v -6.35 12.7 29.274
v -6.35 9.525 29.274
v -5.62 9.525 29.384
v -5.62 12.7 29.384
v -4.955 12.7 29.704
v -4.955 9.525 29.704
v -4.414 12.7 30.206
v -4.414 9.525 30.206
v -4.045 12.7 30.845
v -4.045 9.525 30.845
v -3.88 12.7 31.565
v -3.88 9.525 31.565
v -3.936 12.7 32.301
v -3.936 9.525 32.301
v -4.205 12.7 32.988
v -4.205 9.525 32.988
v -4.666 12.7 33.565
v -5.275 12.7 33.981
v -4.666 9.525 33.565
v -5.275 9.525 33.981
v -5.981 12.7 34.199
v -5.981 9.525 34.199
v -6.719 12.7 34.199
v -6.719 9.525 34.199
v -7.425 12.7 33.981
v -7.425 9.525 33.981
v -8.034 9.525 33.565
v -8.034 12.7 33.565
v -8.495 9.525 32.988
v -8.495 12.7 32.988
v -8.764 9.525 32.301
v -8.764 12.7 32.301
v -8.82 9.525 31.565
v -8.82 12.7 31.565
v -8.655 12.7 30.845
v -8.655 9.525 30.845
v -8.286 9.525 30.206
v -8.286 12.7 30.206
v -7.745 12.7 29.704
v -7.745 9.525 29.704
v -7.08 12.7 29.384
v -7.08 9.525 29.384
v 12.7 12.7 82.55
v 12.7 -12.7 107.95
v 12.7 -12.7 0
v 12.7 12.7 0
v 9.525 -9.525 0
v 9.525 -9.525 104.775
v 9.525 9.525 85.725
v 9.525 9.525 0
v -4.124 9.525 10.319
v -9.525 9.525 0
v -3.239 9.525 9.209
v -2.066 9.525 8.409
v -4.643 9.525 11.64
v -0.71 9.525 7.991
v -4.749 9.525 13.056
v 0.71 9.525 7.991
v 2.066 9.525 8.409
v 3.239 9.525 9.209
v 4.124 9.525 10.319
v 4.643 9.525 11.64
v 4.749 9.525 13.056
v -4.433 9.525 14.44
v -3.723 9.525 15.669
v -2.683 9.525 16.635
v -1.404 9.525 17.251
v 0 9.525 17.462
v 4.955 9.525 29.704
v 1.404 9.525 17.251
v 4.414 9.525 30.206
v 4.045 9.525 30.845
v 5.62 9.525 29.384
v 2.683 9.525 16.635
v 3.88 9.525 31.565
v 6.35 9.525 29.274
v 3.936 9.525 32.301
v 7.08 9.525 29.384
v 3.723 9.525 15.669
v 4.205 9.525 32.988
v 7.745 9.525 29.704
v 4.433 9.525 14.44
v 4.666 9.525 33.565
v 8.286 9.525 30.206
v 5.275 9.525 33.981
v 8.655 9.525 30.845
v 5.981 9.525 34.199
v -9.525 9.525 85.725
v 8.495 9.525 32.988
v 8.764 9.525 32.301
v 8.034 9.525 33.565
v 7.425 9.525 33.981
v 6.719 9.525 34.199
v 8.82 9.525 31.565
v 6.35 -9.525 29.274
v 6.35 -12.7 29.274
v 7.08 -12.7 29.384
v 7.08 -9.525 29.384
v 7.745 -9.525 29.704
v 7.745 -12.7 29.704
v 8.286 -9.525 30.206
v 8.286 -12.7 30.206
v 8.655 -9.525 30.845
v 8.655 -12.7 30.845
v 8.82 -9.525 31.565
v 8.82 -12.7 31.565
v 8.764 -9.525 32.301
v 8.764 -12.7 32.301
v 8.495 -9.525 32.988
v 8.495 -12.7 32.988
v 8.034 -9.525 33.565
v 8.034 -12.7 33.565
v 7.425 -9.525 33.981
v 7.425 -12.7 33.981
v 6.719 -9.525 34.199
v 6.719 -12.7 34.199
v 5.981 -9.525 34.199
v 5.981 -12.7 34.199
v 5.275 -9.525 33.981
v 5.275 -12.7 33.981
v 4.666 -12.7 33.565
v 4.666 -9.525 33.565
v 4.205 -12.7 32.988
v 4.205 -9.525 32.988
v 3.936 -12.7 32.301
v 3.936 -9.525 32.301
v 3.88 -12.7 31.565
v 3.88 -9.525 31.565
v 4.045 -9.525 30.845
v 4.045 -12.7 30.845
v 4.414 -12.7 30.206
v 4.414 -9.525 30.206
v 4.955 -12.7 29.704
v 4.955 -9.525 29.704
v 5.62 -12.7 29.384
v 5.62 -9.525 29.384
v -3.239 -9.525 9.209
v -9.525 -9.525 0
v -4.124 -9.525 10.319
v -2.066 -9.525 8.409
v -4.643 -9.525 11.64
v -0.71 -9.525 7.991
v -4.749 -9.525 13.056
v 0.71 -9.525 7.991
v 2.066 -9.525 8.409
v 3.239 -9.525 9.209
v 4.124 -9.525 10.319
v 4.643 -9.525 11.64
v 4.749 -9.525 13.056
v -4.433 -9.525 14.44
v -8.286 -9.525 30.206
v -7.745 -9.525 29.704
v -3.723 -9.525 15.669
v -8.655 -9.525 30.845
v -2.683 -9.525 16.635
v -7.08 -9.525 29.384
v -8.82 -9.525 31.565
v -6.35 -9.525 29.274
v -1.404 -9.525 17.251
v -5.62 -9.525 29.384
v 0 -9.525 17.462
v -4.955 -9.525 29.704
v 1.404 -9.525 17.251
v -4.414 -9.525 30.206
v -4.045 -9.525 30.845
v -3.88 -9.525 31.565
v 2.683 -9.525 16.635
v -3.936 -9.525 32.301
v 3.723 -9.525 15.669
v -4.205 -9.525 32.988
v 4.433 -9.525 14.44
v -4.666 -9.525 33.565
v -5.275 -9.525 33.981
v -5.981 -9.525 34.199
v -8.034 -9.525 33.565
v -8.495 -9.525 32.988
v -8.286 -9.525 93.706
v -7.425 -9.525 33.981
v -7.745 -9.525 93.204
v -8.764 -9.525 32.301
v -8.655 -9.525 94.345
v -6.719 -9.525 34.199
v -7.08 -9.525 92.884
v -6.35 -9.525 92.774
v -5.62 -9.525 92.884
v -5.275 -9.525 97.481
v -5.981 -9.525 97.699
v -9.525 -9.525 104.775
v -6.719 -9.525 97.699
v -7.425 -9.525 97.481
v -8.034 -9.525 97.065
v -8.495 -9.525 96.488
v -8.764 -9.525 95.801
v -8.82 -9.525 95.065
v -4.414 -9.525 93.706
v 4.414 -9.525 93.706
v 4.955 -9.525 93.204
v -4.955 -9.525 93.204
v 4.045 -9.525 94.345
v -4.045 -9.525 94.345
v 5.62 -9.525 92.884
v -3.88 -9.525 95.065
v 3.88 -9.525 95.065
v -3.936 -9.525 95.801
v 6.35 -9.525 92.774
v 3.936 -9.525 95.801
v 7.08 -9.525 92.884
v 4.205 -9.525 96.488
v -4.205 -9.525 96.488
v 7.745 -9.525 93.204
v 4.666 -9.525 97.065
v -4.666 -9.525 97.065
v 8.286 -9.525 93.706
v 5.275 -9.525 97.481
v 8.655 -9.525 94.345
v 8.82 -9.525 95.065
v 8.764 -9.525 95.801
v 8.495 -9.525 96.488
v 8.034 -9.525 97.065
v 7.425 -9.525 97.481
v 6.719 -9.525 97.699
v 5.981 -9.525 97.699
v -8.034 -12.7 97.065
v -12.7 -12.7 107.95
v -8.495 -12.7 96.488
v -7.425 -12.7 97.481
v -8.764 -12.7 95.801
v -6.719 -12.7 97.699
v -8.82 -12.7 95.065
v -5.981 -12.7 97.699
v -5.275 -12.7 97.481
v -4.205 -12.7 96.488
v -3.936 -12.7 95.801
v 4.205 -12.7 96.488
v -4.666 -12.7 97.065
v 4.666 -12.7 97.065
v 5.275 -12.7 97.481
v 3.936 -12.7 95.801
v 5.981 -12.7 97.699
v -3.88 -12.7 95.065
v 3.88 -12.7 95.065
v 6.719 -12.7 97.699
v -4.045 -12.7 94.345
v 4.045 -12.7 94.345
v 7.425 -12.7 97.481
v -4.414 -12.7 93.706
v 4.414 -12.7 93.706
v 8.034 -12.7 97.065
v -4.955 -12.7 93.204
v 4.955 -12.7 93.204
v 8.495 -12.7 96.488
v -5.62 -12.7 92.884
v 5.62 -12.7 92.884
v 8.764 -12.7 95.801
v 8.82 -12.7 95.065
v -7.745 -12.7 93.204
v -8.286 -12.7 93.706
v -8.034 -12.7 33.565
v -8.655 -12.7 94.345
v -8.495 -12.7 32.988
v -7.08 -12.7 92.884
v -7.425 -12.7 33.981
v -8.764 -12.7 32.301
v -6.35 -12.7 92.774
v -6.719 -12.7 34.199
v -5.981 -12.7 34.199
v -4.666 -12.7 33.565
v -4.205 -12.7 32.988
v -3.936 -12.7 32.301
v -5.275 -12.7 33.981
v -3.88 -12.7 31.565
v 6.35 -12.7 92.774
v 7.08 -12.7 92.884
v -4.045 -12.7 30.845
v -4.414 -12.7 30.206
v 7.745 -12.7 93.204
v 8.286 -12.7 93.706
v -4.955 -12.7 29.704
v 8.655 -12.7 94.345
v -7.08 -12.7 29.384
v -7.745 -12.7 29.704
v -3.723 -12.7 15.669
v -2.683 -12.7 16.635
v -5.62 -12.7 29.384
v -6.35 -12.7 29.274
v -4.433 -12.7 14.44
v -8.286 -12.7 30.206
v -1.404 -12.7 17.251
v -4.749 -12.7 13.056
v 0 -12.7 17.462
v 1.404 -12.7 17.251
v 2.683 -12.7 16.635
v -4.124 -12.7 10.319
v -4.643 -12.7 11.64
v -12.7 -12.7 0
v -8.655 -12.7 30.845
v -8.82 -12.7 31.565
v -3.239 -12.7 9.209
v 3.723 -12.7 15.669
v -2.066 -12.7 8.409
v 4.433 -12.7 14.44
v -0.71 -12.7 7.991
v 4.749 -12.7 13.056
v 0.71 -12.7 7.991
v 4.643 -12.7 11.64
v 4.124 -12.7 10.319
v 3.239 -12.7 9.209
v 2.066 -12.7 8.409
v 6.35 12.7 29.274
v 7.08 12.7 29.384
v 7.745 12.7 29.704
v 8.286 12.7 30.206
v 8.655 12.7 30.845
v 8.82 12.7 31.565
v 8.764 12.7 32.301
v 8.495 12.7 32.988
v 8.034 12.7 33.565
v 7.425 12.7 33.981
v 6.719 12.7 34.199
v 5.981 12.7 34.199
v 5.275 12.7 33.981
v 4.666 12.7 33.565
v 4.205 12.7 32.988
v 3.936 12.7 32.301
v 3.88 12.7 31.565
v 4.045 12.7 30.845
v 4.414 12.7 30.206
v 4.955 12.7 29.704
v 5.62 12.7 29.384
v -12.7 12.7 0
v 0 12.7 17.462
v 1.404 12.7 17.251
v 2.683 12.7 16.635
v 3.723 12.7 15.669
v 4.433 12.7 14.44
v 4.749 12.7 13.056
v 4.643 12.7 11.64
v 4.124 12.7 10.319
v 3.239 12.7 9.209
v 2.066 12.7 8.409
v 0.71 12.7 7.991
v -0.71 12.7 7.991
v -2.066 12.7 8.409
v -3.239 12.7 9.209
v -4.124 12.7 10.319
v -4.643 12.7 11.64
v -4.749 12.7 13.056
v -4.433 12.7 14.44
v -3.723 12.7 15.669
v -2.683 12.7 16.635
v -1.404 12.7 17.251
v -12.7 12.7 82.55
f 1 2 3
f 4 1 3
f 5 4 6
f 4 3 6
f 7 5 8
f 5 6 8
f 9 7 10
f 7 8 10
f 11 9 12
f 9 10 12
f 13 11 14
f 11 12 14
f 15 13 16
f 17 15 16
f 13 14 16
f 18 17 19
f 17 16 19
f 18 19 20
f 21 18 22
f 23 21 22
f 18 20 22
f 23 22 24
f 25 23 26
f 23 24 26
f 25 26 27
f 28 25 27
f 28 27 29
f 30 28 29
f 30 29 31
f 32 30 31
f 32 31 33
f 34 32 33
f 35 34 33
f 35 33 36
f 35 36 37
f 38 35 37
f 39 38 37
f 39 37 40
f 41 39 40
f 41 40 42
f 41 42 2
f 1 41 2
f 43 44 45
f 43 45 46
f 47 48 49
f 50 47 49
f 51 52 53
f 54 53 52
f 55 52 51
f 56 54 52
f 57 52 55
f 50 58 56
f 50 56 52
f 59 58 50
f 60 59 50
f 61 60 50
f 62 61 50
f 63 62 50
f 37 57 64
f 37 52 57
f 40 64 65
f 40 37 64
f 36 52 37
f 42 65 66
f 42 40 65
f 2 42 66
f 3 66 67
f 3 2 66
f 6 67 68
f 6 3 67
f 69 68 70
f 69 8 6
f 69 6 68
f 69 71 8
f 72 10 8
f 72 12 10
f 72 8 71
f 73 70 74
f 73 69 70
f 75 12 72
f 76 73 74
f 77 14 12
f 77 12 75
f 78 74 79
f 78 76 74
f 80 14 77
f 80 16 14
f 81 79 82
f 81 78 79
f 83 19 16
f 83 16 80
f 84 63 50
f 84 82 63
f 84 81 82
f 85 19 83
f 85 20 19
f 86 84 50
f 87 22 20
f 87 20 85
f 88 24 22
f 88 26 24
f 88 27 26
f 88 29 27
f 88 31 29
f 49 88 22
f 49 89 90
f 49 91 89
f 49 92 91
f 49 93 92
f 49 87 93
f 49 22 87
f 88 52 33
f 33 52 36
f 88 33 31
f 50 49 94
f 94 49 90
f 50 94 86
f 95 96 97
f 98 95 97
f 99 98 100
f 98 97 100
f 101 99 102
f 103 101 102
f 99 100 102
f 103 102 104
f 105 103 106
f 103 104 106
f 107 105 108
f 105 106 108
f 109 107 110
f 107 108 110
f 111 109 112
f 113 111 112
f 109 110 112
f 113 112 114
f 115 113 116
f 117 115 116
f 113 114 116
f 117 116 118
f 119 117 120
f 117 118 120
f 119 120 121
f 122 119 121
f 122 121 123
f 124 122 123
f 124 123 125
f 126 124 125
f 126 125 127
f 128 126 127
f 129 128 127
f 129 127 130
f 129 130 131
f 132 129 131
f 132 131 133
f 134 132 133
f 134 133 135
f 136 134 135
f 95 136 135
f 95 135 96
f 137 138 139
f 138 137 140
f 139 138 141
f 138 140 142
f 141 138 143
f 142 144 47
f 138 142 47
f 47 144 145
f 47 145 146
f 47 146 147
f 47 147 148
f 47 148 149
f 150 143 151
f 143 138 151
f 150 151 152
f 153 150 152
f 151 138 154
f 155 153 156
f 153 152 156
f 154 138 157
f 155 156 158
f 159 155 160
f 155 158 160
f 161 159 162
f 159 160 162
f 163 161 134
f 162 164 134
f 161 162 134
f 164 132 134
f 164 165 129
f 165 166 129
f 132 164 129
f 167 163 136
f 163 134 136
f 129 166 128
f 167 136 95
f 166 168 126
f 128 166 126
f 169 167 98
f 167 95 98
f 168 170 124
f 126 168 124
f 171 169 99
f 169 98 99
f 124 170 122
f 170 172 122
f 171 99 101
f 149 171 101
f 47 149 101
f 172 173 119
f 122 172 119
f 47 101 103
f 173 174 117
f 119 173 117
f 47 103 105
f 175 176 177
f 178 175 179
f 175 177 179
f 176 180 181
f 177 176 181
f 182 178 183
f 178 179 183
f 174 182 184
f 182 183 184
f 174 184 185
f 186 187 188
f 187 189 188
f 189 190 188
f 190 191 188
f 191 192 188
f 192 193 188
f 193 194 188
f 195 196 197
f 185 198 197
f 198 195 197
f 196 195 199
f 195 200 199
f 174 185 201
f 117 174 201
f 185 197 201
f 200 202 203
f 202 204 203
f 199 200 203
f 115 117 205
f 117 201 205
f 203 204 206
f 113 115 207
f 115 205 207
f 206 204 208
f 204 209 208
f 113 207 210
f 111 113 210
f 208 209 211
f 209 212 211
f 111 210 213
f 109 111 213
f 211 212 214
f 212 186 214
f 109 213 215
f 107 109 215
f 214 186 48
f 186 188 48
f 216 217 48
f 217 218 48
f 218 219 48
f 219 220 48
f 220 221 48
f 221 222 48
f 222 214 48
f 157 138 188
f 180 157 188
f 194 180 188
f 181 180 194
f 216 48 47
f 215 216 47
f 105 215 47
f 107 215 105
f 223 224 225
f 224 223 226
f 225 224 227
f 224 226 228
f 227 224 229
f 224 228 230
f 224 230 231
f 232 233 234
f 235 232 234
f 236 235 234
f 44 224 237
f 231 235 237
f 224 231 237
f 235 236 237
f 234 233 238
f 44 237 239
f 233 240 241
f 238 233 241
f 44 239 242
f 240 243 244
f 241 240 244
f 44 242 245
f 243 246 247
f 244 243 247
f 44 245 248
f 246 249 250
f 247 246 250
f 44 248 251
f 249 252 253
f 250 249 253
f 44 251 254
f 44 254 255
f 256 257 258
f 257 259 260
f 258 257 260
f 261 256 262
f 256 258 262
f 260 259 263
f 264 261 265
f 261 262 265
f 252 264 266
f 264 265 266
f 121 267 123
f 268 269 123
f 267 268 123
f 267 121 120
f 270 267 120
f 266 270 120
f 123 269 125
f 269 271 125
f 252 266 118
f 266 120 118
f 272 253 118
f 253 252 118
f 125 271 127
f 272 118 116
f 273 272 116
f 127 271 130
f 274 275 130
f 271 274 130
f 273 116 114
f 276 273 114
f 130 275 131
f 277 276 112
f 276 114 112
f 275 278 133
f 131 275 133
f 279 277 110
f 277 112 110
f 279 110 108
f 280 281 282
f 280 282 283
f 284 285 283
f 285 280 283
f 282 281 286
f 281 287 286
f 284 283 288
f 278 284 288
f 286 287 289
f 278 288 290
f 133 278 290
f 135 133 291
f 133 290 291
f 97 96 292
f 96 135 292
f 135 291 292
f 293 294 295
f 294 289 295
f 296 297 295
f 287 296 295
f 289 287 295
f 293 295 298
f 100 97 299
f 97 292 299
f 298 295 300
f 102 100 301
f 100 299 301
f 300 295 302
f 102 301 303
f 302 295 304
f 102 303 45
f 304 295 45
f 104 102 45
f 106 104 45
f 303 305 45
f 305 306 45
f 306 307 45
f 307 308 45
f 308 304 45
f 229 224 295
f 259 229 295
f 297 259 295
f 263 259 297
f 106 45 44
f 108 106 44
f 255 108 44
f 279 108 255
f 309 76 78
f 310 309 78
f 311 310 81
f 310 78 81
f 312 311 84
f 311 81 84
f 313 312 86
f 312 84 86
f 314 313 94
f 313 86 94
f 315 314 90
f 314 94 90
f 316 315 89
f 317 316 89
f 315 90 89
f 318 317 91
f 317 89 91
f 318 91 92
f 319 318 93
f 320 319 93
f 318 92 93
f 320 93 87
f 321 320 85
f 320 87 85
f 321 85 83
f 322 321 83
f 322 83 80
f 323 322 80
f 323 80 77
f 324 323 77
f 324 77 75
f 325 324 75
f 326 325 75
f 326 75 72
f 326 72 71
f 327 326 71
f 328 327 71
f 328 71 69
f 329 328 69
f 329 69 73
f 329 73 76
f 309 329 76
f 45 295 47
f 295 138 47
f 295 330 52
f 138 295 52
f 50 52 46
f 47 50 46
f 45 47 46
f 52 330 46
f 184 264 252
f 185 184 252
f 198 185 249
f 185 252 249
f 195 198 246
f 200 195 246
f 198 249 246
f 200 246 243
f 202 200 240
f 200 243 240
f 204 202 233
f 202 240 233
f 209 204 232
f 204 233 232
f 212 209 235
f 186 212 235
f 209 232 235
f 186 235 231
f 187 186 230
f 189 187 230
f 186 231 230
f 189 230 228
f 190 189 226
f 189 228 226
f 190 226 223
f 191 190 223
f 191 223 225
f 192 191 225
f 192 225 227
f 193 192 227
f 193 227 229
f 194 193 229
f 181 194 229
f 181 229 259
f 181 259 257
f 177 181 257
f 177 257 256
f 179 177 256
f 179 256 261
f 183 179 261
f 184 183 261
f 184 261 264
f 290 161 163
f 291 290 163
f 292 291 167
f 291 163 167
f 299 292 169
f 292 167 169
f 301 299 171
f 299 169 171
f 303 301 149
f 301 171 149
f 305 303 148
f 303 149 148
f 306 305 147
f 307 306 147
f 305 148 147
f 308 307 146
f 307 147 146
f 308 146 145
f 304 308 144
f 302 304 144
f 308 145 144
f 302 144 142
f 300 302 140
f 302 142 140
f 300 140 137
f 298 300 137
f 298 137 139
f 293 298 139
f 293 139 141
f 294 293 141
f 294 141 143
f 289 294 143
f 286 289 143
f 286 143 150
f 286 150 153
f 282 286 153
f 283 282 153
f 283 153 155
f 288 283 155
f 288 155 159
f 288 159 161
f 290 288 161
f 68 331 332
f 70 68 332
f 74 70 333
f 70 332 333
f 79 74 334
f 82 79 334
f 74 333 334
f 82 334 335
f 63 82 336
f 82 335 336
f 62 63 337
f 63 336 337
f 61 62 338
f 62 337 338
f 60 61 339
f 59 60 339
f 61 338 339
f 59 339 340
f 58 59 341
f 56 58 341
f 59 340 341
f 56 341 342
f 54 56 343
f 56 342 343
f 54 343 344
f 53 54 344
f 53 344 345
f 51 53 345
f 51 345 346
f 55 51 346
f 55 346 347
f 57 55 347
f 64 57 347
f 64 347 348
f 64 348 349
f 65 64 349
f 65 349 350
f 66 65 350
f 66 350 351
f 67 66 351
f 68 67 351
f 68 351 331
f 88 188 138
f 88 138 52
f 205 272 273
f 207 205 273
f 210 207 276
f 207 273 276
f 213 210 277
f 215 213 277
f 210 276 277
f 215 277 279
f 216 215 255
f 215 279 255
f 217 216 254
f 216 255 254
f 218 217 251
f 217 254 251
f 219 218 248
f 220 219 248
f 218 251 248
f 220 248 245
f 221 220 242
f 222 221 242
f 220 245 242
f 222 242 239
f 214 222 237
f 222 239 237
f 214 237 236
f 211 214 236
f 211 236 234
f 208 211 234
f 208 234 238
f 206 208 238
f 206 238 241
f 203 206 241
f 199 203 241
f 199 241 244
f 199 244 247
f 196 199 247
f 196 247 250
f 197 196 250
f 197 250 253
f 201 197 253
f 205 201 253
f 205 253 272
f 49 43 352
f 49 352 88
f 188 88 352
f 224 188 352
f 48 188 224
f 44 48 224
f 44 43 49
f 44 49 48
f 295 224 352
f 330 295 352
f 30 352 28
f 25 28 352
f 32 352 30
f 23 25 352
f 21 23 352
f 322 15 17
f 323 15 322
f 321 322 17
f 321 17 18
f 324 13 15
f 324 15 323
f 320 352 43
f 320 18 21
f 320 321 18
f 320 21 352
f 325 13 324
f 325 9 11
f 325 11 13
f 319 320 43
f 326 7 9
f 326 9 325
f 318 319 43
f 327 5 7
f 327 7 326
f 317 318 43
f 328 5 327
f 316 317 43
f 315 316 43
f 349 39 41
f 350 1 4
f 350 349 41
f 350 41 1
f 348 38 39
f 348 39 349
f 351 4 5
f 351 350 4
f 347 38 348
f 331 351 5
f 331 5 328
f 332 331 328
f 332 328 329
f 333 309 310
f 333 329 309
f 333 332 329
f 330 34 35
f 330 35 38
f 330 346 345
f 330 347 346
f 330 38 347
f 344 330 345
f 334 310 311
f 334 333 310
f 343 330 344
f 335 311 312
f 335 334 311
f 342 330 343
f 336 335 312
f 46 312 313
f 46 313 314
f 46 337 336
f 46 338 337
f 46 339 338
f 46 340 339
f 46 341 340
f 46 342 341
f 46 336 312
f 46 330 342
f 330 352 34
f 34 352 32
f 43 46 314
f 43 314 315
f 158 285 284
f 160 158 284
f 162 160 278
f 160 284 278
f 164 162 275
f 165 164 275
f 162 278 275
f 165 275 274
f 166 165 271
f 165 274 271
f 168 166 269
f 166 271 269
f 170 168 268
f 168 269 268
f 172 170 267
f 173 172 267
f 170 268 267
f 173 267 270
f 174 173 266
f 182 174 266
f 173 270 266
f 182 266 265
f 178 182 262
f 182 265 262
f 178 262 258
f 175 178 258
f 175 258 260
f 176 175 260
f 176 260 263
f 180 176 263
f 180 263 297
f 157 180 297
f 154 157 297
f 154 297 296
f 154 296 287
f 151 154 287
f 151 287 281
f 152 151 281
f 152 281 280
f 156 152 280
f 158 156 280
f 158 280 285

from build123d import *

# Parameters (mm, degrees)
SKETCH1_W           = 25.4
SKETCH1_H           = 25.4
BOSS_EXTRUDE1_DEPTH = 107.95
SKETCH2_W           = 19.05
SKETCH2_H           = 19.05
CUT_EXTRUDE1_DEPTH  = 110.433918417
CUT_EXTRUDE2_DEPTH  = 112.622813528
SKETCH5_R           = 2.4765
CUT_EXTRUDE3_DEPTH  = 112.622813528
SKETCH7_R           = 4.7625
CUT_EXTRUDE5_DEPTH  = 112.622813528
SKETCH8_R           = 2.4765
CUT_EXTRUDE6_DEPTH  = 112.622813528


with BuildPart() as part:
    # Sketch1 → Boss-Extrude1 (new body)
    with BuildSketch(Plane.XY):
        Rectangle(SKETCH1_W, SKETCH1_H)
    extrude(amount=BOSS_EXTRUDE1_DEPTH)

    # Sketch2 → Cut-Extrude1 (cut, through all)
    with BuildSketch(Plane.XY.offset(107.95)):
        Rectangle(SKETCH2_W, SKETCH2_H)
    extrude(amount=-CUT_EXTRUDE1_DEPTH, mode=Mode.SUBTRACT)

    # Sketch4 → Cut-Extrude2 (cut, through all)
    with BuildSketch(Plane(origin=(12.7, 0, 0), x_dir=(0, 0, -1), z_dir=(1, 0, 0))):
        Polygon((-107.95, 12.7), (-82.55, 12.7), (-107.95, -12.7), align=None)
    extrude(amount=-CUT_EXTRUDE2_DEPTH, mode=Mode.SUBTRACT)

    # Sketch5 → Cut-Extrude3 (cut, through all)
    with BuildSketch(Plane.XZ.offset(12.7)):
        with Locations(Location((-6.35, 95.25, 0), (0, 0, 270))):
            Circle(SKETCH5_R)
        with Locations(Location((6.35, 95.25, 0), (0, 0, 270))):
            Circle(SKETCH5_R)
    extrude(amount=-CUT_EXTRUDE3_DEPTH, mode=Mode.SUBTRACT)

    # Sketch7 → Cut-Extrude5 (cut, through all)
    with BuildSketch(Plane(origin=(0, 12.7, 0), x_dir=(1, 0, 0), z_dir=(0, 1, 0))):
        with Locations(Location((0, -12.7, 0), (0, 0, 270))):
            Circle(SKETCH7_R)
    extrude(amount=-CUT_EXTRUDE5_DEPTH, mode=Mode.SUBTRACT)

    # Sketch8 → Cut-Extrude6 (cut, through all)
    with BuildSketch(Plane.XZ.offset(12.7)):
        with Locations(Location((6.35, 31.75, 0), (0, 0, 270))):
            Circle(SKETCH8_R)
        with Locations(Location((-6.35, 31.75, 0), (0, 0, 270))):
            Circle(SKETCH8_R)
    extrude(amount=-CUT_EXTRUDE6_DEPTH, mode=Mode.SUBTRACT)


solid = part.part
